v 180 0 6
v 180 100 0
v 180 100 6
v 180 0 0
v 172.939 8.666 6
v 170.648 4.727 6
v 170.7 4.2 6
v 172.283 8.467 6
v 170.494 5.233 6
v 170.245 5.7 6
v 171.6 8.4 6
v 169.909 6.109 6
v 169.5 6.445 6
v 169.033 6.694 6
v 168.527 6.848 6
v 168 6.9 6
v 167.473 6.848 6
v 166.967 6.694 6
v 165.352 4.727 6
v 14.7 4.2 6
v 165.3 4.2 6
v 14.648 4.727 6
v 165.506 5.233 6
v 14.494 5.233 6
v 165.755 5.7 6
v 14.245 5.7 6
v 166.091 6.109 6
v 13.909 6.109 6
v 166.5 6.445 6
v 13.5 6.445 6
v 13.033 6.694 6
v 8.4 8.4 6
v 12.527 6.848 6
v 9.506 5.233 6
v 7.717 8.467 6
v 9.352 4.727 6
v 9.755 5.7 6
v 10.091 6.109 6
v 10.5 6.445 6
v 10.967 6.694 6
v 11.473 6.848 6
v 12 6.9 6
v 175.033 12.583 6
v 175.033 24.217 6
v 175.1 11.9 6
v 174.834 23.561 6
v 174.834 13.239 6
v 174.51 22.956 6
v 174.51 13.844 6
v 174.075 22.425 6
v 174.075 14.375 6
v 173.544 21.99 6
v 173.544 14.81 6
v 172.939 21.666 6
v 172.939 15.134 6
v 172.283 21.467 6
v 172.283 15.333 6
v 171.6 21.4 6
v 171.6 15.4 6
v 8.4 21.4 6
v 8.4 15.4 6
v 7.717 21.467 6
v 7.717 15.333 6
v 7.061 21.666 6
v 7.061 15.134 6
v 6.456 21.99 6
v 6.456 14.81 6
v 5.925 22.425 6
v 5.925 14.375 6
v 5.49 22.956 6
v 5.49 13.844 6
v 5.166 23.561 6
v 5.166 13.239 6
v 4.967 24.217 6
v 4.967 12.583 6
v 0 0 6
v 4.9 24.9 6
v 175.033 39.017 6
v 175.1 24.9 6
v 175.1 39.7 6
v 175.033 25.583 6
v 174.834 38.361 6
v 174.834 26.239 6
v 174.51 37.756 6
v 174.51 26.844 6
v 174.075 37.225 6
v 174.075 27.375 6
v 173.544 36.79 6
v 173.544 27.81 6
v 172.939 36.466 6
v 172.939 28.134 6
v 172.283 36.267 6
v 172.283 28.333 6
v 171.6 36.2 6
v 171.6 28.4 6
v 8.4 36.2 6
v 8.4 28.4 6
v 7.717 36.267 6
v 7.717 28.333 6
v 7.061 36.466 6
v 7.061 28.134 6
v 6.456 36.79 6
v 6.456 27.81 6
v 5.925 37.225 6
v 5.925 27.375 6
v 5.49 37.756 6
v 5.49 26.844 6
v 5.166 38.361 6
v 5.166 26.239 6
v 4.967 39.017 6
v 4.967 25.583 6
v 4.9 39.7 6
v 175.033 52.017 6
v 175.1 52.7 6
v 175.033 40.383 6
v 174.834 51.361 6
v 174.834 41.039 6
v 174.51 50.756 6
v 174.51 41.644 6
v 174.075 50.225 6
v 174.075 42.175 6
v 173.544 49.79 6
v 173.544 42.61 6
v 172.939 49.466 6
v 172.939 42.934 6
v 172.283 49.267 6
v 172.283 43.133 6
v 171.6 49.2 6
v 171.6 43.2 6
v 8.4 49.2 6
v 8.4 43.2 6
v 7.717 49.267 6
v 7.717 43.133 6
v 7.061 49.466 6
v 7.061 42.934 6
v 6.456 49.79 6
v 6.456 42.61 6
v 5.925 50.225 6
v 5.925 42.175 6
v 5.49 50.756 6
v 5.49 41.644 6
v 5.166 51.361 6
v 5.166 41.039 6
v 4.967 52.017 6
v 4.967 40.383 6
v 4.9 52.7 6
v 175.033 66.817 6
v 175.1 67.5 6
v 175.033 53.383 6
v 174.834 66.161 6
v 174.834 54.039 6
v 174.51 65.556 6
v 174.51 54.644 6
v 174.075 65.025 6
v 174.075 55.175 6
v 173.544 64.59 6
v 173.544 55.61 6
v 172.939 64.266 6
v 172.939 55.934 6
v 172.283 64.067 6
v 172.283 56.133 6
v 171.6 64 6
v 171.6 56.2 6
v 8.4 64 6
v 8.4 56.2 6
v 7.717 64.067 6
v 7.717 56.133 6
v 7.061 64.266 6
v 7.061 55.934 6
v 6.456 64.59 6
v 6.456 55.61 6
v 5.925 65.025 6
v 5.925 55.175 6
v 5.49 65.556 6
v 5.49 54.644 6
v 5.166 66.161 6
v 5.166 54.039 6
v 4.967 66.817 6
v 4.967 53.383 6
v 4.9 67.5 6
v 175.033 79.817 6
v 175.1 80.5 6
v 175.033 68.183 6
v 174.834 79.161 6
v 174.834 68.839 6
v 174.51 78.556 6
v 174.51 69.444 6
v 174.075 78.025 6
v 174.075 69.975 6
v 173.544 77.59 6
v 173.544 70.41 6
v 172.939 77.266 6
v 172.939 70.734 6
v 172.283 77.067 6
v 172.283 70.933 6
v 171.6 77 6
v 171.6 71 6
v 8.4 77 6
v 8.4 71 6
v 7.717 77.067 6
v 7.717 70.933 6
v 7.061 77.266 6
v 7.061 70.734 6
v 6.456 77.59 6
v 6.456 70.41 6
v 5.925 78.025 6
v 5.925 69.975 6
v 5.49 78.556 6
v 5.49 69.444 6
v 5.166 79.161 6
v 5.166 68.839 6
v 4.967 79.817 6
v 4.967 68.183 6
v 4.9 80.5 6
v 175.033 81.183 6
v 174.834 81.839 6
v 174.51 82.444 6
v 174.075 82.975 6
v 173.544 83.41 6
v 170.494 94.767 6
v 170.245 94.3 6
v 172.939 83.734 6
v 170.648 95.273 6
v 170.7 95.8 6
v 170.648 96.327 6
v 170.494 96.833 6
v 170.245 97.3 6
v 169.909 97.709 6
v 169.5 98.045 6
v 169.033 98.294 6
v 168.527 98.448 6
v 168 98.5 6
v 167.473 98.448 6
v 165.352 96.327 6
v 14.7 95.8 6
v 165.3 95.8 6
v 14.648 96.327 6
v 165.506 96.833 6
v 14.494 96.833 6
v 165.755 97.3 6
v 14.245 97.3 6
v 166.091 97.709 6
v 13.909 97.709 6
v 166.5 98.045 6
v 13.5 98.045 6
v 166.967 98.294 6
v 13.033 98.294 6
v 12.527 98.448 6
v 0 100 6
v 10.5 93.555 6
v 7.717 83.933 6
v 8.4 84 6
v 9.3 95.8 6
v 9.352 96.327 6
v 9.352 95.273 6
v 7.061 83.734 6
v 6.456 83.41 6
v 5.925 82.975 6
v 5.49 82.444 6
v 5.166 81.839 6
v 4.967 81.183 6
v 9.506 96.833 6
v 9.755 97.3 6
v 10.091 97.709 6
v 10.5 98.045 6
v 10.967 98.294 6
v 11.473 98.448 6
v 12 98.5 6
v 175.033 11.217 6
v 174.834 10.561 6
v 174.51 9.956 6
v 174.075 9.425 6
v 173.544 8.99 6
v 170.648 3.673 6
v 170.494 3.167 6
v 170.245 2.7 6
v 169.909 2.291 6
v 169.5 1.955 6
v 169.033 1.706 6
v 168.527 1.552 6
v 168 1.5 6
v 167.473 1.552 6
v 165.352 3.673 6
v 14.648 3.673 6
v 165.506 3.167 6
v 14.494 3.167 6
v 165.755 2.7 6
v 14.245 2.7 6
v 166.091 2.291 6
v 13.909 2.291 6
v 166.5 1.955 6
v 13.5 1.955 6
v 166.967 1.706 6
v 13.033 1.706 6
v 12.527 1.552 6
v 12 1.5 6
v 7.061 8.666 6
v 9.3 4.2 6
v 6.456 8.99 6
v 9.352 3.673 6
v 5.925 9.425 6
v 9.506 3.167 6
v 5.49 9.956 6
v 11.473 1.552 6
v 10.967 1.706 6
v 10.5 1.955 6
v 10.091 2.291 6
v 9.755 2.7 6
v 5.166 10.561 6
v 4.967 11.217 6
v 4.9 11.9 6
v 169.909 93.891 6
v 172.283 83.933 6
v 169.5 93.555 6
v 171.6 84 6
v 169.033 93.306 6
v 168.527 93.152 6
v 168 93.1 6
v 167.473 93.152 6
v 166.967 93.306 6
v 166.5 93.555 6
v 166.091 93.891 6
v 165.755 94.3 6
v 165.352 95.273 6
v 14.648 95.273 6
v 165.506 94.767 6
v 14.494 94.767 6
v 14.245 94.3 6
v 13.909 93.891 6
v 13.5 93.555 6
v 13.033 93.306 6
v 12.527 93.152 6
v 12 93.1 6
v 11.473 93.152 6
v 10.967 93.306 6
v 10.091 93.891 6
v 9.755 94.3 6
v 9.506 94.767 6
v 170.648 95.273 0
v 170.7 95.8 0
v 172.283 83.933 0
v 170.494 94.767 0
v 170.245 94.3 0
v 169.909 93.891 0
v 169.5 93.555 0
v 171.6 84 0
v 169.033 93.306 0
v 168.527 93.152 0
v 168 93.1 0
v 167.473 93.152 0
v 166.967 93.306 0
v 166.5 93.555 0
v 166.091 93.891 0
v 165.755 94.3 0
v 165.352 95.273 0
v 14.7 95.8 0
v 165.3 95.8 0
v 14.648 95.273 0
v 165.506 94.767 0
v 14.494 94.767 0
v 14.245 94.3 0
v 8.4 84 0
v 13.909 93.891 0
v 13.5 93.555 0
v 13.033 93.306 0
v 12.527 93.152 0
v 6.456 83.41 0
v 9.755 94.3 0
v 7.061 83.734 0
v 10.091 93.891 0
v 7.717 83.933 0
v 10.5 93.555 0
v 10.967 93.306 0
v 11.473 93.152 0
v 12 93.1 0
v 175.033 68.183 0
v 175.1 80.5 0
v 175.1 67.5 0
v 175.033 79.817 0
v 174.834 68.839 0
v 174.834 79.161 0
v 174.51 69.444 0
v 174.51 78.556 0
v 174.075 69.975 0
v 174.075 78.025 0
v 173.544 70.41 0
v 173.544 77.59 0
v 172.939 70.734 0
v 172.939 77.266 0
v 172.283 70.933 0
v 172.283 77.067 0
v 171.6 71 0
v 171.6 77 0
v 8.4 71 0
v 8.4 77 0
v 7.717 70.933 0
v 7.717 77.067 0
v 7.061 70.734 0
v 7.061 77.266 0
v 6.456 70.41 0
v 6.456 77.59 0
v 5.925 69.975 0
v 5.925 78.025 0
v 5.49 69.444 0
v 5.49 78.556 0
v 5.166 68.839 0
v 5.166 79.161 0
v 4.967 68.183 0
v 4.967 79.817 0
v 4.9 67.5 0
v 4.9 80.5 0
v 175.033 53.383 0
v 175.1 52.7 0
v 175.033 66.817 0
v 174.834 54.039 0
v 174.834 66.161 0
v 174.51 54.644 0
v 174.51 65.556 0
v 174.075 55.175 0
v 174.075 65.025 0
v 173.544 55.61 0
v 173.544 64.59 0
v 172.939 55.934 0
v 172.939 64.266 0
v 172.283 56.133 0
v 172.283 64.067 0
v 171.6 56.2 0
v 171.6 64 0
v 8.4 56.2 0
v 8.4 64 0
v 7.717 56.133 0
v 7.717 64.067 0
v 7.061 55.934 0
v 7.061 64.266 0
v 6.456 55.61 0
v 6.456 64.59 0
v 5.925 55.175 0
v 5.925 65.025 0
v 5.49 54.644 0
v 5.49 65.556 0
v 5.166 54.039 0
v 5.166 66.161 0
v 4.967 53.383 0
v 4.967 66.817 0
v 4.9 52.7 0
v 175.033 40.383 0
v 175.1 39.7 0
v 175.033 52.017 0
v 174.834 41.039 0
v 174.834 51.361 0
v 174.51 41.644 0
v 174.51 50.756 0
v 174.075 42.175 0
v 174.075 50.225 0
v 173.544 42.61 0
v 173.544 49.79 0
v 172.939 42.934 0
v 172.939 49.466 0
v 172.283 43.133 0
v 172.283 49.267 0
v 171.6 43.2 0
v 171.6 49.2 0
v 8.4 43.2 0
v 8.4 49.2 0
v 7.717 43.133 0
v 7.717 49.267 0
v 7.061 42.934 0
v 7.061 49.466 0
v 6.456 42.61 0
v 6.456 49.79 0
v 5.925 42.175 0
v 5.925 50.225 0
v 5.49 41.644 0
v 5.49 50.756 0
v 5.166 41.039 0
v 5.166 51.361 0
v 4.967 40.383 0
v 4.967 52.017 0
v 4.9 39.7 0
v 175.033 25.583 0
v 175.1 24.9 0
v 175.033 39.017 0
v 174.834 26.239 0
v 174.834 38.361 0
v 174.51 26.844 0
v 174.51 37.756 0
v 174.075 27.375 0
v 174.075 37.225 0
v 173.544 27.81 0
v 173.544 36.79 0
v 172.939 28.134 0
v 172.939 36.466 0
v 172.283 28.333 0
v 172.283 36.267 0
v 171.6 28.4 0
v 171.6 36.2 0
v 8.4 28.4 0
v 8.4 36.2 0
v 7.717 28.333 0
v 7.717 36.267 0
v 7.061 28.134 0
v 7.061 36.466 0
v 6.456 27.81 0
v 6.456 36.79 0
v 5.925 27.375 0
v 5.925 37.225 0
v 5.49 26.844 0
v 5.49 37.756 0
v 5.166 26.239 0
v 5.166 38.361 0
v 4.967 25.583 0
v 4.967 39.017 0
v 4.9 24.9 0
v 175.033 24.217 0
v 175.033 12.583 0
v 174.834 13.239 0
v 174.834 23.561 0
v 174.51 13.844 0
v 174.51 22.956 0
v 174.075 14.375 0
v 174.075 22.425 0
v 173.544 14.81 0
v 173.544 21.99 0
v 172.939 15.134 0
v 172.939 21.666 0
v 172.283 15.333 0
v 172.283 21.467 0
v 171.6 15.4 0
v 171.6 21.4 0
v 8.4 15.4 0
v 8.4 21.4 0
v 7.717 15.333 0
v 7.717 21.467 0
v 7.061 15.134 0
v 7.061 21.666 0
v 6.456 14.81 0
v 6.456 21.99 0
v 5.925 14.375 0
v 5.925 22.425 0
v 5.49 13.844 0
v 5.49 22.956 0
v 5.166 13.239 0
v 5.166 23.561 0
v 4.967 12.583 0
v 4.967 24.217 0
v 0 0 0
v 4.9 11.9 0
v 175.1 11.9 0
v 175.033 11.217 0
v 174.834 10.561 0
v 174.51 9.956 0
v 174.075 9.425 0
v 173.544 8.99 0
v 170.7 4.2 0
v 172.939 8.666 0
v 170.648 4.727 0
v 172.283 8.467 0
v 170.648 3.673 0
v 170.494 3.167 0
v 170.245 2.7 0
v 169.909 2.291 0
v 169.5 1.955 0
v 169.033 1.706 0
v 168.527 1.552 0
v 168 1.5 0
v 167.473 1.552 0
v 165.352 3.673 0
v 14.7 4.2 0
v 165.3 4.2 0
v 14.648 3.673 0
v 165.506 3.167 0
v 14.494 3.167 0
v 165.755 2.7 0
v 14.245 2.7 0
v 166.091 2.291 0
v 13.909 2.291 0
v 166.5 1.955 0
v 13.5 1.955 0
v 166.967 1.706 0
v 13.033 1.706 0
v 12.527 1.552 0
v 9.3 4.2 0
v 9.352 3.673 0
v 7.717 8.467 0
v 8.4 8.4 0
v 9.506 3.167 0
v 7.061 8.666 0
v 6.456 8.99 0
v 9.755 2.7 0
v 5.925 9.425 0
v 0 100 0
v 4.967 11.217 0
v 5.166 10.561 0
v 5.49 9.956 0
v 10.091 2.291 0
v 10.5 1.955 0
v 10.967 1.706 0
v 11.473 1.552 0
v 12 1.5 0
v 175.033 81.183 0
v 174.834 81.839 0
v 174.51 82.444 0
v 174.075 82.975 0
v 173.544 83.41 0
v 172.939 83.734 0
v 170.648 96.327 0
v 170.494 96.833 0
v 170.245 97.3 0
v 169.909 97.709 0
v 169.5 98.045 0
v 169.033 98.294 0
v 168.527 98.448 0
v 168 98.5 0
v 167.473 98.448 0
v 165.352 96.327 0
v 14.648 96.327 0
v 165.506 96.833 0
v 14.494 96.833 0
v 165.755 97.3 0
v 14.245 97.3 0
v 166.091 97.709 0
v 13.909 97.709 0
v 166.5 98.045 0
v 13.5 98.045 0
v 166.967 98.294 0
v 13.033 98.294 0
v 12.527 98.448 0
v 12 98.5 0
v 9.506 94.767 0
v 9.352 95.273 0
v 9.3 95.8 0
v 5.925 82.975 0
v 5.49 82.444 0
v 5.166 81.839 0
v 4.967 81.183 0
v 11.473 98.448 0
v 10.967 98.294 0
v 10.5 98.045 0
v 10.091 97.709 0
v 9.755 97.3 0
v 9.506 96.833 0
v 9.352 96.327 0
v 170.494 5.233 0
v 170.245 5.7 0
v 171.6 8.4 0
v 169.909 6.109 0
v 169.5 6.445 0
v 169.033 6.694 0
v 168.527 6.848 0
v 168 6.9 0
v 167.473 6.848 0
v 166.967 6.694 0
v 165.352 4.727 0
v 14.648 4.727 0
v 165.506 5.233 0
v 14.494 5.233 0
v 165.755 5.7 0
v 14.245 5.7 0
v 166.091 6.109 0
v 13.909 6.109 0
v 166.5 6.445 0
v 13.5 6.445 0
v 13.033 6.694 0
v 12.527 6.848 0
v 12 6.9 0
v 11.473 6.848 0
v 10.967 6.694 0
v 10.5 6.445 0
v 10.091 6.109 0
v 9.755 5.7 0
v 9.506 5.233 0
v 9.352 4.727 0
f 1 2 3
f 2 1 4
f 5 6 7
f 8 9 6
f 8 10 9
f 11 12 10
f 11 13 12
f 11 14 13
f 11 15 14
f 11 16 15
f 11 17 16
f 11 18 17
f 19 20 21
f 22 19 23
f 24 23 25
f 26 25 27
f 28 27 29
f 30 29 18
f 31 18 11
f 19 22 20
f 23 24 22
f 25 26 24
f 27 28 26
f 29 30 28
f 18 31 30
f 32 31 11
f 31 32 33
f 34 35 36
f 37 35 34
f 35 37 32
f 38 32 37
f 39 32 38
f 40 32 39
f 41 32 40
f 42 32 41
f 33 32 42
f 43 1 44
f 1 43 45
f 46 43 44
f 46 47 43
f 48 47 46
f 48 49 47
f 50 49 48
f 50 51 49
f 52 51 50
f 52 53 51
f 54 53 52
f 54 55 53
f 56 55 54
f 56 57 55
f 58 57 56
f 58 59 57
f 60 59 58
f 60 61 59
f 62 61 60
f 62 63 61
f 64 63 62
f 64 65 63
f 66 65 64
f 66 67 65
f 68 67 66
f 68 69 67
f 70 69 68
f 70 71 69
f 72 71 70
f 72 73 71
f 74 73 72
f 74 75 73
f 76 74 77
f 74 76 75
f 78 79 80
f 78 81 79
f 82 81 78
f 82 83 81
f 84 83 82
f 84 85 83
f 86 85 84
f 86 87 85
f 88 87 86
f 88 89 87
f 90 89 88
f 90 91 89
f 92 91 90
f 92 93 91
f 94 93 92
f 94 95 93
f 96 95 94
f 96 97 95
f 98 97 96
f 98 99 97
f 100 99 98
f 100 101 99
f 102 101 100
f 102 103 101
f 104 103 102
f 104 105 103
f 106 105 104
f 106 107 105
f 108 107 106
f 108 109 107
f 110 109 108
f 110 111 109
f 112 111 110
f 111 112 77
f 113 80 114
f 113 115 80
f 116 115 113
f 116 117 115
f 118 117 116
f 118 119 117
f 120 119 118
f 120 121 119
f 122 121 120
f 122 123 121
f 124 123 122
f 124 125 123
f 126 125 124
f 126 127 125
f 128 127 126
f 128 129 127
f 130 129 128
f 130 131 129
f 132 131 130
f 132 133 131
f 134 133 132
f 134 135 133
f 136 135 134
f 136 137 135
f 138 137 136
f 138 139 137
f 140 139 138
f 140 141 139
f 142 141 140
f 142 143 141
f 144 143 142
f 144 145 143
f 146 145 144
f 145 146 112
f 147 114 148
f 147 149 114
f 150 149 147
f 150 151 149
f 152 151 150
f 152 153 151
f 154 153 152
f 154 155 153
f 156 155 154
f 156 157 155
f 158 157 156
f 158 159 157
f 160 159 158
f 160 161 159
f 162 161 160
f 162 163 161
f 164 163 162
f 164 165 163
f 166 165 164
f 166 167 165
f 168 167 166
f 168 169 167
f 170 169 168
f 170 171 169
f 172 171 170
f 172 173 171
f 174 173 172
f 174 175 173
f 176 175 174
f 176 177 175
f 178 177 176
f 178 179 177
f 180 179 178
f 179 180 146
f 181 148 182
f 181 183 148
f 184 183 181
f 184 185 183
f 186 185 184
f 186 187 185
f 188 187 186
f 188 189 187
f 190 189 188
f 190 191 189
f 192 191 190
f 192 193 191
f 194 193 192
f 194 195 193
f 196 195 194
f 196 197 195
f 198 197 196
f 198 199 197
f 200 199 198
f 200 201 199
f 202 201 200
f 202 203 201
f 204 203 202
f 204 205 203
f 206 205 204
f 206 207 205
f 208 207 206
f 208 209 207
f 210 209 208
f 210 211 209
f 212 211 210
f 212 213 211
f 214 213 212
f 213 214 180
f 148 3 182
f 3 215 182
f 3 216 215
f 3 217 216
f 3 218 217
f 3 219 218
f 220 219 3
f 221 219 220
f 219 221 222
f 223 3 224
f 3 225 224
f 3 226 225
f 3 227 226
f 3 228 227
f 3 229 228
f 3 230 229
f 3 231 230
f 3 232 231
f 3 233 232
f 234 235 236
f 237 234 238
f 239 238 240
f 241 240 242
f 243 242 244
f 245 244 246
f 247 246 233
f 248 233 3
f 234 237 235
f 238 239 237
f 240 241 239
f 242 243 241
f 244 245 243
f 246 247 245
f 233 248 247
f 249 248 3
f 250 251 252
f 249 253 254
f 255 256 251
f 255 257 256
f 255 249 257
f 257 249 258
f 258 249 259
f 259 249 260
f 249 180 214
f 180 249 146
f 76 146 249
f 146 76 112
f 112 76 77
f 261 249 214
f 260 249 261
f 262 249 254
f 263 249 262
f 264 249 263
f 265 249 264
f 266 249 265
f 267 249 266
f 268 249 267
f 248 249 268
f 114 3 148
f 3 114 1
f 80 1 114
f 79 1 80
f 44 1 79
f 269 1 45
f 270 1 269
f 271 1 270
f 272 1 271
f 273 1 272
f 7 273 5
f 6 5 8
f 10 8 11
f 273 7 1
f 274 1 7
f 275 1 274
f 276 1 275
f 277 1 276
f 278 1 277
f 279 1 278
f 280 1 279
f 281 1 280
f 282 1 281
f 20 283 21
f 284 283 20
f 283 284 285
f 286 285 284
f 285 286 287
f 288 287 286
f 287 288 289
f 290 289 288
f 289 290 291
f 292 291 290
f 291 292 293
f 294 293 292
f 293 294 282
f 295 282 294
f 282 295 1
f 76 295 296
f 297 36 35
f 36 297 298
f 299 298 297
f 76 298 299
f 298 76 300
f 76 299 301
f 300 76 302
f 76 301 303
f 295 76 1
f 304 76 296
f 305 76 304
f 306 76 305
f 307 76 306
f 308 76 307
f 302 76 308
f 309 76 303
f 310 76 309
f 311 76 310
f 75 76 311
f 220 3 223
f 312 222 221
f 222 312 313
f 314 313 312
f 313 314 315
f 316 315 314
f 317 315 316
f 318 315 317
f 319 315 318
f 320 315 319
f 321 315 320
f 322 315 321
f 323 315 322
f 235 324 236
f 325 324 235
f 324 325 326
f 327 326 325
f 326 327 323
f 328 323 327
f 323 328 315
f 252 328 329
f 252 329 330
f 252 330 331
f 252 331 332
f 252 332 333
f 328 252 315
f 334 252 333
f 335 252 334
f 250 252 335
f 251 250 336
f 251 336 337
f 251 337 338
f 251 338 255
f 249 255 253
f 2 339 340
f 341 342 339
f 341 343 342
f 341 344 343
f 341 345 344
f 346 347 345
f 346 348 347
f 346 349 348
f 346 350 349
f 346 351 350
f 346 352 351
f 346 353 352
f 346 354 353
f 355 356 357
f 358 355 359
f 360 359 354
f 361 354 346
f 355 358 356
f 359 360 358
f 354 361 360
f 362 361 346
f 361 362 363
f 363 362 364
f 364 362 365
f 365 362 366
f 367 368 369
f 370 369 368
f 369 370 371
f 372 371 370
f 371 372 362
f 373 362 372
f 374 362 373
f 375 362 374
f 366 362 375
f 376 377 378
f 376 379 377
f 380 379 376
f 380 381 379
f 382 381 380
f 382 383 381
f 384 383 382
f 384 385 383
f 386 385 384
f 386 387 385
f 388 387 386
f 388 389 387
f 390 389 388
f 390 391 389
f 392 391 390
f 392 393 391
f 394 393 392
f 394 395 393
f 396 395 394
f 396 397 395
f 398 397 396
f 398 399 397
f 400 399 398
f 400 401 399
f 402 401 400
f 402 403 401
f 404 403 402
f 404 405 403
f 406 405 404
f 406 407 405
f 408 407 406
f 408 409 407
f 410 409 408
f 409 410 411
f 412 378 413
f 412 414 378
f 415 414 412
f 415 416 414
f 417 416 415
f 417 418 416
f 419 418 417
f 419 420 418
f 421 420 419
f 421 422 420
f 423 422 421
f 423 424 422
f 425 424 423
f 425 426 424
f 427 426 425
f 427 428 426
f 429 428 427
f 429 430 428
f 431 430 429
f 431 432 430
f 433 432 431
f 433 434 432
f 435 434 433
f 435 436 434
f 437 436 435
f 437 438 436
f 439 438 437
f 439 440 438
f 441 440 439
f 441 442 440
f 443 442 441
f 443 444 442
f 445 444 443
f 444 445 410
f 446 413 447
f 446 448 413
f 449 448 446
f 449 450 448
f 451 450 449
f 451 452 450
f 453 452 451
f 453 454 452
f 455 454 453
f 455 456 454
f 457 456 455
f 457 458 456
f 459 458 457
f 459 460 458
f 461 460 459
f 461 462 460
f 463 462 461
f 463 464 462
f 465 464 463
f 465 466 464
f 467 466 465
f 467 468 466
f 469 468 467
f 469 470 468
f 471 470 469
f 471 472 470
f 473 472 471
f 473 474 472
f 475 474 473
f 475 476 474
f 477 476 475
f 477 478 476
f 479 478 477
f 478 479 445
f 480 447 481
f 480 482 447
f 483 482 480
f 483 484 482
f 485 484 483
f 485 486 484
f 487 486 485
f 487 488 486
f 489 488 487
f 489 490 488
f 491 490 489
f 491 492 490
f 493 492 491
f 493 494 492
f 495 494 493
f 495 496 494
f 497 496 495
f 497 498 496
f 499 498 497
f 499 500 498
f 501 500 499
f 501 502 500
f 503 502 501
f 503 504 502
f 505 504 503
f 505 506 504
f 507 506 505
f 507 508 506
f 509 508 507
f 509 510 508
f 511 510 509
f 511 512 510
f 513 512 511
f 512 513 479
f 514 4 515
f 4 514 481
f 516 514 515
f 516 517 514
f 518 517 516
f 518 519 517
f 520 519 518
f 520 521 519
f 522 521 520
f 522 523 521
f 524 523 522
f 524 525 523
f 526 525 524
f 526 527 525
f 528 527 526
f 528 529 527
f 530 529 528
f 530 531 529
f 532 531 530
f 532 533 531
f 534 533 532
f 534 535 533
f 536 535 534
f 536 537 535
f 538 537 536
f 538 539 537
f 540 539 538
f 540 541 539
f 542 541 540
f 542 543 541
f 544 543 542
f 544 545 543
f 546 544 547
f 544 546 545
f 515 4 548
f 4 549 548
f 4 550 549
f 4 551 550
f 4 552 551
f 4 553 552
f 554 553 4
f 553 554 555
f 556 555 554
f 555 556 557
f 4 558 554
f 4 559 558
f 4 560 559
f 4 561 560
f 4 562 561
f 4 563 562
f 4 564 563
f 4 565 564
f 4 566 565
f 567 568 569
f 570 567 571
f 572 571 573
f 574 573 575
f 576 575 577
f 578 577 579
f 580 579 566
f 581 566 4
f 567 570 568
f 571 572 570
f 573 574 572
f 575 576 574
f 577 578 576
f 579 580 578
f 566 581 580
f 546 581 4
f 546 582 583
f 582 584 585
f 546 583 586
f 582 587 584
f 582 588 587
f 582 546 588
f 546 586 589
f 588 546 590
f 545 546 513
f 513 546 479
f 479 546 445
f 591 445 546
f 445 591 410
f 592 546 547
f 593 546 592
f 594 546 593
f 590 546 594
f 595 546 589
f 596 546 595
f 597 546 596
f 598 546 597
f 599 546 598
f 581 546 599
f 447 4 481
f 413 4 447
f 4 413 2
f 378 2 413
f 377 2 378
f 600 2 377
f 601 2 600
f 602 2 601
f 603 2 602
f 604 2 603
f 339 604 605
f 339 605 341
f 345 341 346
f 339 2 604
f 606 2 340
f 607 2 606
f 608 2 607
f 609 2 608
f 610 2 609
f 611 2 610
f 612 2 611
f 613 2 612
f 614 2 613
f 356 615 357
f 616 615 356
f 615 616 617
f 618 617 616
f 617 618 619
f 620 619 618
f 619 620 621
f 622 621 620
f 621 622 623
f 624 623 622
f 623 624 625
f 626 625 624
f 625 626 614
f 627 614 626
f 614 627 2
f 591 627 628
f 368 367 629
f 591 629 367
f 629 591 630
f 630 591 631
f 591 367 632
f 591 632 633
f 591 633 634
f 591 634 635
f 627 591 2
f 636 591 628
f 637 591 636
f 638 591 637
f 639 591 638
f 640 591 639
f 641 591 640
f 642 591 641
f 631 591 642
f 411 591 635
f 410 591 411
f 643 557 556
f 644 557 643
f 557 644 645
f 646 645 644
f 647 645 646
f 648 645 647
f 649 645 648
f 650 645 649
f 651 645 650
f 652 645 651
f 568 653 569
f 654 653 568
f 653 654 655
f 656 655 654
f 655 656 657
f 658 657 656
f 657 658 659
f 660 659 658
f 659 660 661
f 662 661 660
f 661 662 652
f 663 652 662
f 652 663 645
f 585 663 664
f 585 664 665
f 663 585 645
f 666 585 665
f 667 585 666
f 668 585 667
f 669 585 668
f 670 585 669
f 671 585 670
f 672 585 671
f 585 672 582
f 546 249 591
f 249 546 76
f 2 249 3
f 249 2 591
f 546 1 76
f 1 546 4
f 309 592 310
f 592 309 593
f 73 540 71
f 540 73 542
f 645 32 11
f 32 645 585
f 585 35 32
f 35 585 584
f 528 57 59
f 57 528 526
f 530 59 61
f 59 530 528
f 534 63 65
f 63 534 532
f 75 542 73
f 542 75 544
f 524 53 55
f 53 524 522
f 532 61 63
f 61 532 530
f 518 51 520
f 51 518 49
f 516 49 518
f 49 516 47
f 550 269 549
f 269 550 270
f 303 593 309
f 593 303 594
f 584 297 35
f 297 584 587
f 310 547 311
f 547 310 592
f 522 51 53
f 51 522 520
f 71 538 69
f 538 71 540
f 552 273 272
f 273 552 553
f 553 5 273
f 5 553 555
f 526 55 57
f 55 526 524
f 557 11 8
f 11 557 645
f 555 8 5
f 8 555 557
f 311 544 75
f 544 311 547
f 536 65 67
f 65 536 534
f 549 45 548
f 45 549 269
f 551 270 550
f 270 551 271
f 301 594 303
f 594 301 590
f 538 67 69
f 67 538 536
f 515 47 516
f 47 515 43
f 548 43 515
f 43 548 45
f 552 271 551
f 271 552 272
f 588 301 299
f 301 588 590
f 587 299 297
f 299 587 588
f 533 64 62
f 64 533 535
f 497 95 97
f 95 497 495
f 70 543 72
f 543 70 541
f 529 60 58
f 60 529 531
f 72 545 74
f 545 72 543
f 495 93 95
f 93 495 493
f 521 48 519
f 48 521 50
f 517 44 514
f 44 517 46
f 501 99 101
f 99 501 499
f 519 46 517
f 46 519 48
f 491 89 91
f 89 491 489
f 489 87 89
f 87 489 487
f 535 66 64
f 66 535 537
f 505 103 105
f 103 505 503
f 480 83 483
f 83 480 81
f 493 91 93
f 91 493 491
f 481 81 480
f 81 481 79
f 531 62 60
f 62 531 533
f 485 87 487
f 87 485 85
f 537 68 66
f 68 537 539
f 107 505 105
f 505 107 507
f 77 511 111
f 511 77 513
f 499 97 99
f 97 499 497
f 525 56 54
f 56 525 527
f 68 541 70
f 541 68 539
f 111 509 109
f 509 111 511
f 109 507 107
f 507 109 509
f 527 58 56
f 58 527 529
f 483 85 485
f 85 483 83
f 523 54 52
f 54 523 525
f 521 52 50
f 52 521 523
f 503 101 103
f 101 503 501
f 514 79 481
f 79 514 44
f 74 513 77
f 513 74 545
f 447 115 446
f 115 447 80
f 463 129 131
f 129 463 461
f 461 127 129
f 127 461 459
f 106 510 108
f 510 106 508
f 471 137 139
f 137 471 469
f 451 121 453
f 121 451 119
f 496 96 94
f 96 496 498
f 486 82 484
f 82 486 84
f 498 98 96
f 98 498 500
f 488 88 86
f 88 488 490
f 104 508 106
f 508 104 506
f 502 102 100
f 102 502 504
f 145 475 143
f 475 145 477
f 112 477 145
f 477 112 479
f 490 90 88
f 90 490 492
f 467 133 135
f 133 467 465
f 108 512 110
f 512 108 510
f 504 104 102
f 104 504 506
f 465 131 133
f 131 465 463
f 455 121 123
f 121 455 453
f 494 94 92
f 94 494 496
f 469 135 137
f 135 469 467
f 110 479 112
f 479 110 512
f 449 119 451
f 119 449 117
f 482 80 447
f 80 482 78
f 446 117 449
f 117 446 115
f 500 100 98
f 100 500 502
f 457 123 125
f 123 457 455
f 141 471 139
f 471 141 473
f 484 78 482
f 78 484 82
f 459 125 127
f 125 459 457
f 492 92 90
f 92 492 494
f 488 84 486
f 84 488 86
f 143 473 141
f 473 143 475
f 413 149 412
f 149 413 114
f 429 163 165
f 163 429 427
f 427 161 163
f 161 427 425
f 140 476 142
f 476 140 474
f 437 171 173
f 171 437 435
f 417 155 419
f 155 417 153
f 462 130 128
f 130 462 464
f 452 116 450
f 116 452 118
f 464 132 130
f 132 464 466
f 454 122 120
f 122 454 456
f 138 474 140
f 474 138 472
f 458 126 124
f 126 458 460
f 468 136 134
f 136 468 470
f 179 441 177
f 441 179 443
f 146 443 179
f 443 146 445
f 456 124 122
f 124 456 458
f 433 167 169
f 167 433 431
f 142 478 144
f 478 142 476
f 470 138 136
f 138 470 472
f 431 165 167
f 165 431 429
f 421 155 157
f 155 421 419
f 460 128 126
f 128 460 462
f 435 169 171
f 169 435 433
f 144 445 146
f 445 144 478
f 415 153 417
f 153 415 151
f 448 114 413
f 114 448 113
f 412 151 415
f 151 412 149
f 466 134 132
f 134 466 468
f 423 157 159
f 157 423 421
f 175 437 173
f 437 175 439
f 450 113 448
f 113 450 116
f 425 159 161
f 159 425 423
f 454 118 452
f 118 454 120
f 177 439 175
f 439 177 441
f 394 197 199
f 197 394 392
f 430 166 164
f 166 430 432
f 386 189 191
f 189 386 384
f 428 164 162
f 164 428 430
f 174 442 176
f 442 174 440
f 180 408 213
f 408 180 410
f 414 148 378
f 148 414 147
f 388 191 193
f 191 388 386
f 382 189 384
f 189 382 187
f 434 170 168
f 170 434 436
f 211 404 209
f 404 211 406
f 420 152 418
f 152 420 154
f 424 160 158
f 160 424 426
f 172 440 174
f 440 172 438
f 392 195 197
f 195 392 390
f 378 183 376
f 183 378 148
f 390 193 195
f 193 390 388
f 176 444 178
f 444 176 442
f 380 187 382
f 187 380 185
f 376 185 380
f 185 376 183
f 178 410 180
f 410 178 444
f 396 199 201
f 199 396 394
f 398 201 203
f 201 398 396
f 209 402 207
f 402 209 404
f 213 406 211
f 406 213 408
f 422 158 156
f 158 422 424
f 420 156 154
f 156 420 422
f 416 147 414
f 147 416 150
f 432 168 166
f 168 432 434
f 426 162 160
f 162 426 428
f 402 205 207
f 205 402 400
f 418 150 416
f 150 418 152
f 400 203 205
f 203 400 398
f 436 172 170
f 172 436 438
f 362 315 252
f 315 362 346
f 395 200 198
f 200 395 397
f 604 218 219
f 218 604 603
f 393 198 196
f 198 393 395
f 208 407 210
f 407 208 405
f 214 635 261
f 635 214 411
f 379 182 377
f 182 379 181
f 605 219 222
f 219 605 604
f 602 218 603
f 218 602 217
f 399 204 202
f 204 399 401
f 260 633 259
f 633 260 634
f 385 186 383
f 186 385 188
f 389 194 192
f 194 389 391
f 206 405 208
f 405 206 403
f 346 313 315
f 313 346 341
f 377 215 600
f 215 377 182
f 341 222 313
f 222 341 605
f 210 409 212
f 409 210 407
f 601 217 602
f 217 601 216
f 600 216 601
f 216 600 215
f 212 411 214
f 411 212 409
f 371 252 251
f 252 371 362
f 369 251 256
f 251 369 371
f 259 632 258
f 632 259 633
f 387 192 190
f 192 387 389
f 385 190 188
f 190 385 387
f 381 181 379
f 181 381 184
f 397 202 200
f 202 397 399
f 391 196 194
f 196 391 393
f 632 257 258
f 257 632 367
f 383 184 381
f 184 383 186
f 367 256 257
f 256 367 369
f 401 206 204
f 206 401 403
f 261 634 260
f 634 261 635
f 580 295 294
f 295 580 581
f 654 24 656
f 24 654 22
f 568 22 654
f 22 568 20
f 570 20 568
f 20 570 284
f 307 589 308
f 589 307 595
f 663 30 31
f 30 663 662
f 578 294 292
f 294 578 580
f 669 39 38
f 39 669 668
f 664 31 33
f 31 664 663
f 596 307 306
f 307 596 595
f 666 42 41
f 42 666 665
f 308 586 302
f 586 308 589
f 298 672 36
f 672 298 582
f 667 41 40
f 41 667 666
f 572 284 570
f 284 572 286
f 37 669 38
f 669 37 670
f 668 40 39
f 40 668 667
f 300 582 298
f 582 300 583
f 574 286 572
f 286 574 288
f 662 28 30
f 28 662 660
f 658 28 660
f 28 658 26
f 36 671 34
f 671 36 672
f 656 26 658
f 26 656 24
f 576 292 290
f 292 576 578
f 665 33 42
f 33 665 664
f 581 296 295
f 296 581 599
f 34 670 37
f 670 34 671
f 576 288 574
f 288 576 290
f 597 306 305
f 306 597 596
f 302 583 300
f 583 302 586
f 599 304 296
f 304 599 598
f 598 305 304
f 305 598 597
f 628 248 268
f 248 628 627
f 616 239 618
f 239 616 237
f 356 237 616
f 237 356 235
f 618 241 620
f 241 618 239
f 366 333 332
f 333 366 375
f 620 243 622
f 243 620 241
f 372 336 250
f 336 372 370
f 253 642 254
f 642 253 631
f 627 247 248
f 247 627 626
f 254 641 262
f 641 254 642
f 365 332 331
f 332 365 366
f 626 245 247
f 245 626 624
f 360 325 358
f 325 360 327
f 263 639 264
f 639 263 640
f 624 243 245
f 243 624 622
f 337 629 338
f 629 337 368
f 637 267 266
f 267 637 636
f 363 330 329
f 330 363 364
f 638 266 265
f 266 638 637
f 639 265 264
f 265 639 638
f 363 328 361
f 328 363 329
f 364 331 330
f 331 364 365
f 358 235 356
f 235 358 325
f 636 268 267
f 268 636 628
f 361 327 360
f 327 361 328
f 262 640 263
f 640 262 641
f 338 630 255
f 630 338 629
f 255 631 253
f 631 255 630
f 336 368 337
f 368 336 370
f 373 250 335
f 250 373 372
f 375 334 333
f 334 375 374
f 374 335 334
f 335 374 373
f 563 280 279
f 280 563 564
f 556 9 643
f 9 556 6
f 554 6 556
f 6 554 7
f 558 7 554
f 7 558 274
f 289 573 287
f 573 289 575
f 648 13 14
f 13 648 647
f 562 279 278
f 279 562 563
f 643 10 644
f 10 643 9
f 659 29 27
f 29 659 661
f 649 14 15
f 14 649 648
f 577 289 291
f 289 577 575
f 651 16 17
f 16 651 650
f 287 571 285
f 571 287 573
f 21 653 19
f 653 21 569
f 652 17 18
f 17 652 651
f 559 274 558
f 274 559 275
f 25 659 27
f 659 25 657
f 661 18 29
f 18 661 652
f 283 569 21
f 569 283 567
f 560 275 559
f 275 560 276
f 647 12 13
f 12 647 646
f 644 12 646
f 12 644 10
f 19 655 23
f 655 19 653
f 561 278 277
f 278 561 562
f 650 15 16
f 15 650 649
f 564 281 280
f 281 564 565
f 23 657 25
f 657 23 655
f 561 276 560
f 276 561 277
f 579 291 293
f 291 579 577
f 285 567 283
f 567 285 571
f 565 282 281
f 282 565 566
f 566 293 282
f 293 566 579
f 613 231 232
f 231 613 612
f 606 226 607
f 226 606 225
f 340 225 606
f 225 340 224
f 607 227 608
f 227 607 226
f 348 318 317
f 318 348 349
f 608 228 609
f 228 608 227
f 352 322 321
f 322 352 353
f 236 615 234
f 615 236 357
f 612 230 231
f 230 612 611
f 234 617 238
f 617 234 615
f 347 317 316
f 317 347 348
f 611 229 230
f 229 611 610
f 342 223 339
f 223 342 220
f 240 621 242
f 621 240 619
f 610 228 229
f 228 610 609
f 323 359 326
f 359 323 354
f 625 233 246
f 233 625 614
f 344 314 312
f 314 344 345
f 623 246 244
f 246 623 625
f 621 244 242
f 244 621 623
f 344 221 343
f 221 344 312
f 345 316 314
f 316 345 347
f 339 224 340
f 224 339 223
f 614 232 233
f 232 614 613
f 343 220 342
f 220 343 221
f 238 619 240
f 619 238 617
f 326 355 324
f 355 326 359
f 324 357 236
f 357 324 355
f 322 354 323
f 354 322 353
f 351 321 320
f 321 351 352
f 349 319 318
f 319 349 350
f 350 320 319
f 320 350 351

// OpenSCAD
$fn = 32;

// ----------------------------------------------------------------------
// Slotted panel: 180 x 100 mm, 6 рядов of slots
// ----------------------------------------------------------------------

// --- parameters (mm) ---
panel_w = 180;            // panel width
panel_d = 100;            // panel depth
thick = 6;                // panel thickness
slot_w = 7;               // slot width
pitch0 = 13;              // first row pitch
pitch_step = 1.8;         // pitch increase per row
margin = 8.4;             // margin around the slot field
rows = 6;                 // number of slot rows
mount_d = 5.4;            // mounting holes
mount_x = 78;             // mounting hole offset

difference() {
  union() {
    cube([panel_w, panel_d, thick]);
  }
  /* slot rows: stadium shaped cutters, 2.5 mm clear of both faces */
  /* row 0: pitch 13, length 163.2 */
  hull() {
    translate([8.4, 11.9, -2.5]) cylinder(h = thick + 5, d = slot_w);
    translate([171.6, 11.9, -2.5]) cylinder(h = thick + 5, d = slot_w);
  }
  /* row 1: pitch 14.8, length 163.2 */
  hull() {
    translate([8.4, 24.9, -2.5]) cylinder(h = thick + 5, d = slot_w);
    translate([171.6, 24.9, -2.5]) cylinder(h = thick + 5, d = slot_w);
  }
  /* row 2: pitch 13, length 163.2 */
  hull() {
    translate([8.4, 39.7, -2.5]) cylinder(h = thick + 5, d = slot_w);
    translate([171.6, 39.7, -2.5]) cylinder(h = thick + 5, d = slot_w);
  }
  /* row 3: pitch 14.8, length 163.2 */
  hull() {
    translate([8.4, 52.7, -2.5]) cylinder(h = thick + 5, d = slot_w);
    translate([171.6, 52.7, -2.5]) cylinder(h = thick + 5, d = slot_w);
  }
  /* row 4: pitch 13, length 163.2 */
  hull() {
    translate([8.4, 67.5, -2.5]) cylinder(h = thick + 5, d = slot_w);
    translate([171.6, 67.5, -2.5]) cylinder(h = thick + 5, d = slot_w);
  }
  /* row 5: pitch 14.8, length 163.2 */
  hull() {
    translate([8.4, 80.5, -2.5]) cylinder(h = thick + 5, d = slot_w);
    translate([171.6, 80.5, -2.5]) cylinder(h = thick + 5, d = slot_w);
  }
  translate([12, 4.2, -2.5]) cylinder(h = 11, d = mount_d);
  translate([12, 95.8, -2.5]) cylinder(h = 11, d = mount_d);
  translate([168, 4.2, -2.5]) cylinder(h = 11, d = mount_d);
  translate([168, 95.8, -2.5]) cylinder(h = 11, d = mount_d);
}
